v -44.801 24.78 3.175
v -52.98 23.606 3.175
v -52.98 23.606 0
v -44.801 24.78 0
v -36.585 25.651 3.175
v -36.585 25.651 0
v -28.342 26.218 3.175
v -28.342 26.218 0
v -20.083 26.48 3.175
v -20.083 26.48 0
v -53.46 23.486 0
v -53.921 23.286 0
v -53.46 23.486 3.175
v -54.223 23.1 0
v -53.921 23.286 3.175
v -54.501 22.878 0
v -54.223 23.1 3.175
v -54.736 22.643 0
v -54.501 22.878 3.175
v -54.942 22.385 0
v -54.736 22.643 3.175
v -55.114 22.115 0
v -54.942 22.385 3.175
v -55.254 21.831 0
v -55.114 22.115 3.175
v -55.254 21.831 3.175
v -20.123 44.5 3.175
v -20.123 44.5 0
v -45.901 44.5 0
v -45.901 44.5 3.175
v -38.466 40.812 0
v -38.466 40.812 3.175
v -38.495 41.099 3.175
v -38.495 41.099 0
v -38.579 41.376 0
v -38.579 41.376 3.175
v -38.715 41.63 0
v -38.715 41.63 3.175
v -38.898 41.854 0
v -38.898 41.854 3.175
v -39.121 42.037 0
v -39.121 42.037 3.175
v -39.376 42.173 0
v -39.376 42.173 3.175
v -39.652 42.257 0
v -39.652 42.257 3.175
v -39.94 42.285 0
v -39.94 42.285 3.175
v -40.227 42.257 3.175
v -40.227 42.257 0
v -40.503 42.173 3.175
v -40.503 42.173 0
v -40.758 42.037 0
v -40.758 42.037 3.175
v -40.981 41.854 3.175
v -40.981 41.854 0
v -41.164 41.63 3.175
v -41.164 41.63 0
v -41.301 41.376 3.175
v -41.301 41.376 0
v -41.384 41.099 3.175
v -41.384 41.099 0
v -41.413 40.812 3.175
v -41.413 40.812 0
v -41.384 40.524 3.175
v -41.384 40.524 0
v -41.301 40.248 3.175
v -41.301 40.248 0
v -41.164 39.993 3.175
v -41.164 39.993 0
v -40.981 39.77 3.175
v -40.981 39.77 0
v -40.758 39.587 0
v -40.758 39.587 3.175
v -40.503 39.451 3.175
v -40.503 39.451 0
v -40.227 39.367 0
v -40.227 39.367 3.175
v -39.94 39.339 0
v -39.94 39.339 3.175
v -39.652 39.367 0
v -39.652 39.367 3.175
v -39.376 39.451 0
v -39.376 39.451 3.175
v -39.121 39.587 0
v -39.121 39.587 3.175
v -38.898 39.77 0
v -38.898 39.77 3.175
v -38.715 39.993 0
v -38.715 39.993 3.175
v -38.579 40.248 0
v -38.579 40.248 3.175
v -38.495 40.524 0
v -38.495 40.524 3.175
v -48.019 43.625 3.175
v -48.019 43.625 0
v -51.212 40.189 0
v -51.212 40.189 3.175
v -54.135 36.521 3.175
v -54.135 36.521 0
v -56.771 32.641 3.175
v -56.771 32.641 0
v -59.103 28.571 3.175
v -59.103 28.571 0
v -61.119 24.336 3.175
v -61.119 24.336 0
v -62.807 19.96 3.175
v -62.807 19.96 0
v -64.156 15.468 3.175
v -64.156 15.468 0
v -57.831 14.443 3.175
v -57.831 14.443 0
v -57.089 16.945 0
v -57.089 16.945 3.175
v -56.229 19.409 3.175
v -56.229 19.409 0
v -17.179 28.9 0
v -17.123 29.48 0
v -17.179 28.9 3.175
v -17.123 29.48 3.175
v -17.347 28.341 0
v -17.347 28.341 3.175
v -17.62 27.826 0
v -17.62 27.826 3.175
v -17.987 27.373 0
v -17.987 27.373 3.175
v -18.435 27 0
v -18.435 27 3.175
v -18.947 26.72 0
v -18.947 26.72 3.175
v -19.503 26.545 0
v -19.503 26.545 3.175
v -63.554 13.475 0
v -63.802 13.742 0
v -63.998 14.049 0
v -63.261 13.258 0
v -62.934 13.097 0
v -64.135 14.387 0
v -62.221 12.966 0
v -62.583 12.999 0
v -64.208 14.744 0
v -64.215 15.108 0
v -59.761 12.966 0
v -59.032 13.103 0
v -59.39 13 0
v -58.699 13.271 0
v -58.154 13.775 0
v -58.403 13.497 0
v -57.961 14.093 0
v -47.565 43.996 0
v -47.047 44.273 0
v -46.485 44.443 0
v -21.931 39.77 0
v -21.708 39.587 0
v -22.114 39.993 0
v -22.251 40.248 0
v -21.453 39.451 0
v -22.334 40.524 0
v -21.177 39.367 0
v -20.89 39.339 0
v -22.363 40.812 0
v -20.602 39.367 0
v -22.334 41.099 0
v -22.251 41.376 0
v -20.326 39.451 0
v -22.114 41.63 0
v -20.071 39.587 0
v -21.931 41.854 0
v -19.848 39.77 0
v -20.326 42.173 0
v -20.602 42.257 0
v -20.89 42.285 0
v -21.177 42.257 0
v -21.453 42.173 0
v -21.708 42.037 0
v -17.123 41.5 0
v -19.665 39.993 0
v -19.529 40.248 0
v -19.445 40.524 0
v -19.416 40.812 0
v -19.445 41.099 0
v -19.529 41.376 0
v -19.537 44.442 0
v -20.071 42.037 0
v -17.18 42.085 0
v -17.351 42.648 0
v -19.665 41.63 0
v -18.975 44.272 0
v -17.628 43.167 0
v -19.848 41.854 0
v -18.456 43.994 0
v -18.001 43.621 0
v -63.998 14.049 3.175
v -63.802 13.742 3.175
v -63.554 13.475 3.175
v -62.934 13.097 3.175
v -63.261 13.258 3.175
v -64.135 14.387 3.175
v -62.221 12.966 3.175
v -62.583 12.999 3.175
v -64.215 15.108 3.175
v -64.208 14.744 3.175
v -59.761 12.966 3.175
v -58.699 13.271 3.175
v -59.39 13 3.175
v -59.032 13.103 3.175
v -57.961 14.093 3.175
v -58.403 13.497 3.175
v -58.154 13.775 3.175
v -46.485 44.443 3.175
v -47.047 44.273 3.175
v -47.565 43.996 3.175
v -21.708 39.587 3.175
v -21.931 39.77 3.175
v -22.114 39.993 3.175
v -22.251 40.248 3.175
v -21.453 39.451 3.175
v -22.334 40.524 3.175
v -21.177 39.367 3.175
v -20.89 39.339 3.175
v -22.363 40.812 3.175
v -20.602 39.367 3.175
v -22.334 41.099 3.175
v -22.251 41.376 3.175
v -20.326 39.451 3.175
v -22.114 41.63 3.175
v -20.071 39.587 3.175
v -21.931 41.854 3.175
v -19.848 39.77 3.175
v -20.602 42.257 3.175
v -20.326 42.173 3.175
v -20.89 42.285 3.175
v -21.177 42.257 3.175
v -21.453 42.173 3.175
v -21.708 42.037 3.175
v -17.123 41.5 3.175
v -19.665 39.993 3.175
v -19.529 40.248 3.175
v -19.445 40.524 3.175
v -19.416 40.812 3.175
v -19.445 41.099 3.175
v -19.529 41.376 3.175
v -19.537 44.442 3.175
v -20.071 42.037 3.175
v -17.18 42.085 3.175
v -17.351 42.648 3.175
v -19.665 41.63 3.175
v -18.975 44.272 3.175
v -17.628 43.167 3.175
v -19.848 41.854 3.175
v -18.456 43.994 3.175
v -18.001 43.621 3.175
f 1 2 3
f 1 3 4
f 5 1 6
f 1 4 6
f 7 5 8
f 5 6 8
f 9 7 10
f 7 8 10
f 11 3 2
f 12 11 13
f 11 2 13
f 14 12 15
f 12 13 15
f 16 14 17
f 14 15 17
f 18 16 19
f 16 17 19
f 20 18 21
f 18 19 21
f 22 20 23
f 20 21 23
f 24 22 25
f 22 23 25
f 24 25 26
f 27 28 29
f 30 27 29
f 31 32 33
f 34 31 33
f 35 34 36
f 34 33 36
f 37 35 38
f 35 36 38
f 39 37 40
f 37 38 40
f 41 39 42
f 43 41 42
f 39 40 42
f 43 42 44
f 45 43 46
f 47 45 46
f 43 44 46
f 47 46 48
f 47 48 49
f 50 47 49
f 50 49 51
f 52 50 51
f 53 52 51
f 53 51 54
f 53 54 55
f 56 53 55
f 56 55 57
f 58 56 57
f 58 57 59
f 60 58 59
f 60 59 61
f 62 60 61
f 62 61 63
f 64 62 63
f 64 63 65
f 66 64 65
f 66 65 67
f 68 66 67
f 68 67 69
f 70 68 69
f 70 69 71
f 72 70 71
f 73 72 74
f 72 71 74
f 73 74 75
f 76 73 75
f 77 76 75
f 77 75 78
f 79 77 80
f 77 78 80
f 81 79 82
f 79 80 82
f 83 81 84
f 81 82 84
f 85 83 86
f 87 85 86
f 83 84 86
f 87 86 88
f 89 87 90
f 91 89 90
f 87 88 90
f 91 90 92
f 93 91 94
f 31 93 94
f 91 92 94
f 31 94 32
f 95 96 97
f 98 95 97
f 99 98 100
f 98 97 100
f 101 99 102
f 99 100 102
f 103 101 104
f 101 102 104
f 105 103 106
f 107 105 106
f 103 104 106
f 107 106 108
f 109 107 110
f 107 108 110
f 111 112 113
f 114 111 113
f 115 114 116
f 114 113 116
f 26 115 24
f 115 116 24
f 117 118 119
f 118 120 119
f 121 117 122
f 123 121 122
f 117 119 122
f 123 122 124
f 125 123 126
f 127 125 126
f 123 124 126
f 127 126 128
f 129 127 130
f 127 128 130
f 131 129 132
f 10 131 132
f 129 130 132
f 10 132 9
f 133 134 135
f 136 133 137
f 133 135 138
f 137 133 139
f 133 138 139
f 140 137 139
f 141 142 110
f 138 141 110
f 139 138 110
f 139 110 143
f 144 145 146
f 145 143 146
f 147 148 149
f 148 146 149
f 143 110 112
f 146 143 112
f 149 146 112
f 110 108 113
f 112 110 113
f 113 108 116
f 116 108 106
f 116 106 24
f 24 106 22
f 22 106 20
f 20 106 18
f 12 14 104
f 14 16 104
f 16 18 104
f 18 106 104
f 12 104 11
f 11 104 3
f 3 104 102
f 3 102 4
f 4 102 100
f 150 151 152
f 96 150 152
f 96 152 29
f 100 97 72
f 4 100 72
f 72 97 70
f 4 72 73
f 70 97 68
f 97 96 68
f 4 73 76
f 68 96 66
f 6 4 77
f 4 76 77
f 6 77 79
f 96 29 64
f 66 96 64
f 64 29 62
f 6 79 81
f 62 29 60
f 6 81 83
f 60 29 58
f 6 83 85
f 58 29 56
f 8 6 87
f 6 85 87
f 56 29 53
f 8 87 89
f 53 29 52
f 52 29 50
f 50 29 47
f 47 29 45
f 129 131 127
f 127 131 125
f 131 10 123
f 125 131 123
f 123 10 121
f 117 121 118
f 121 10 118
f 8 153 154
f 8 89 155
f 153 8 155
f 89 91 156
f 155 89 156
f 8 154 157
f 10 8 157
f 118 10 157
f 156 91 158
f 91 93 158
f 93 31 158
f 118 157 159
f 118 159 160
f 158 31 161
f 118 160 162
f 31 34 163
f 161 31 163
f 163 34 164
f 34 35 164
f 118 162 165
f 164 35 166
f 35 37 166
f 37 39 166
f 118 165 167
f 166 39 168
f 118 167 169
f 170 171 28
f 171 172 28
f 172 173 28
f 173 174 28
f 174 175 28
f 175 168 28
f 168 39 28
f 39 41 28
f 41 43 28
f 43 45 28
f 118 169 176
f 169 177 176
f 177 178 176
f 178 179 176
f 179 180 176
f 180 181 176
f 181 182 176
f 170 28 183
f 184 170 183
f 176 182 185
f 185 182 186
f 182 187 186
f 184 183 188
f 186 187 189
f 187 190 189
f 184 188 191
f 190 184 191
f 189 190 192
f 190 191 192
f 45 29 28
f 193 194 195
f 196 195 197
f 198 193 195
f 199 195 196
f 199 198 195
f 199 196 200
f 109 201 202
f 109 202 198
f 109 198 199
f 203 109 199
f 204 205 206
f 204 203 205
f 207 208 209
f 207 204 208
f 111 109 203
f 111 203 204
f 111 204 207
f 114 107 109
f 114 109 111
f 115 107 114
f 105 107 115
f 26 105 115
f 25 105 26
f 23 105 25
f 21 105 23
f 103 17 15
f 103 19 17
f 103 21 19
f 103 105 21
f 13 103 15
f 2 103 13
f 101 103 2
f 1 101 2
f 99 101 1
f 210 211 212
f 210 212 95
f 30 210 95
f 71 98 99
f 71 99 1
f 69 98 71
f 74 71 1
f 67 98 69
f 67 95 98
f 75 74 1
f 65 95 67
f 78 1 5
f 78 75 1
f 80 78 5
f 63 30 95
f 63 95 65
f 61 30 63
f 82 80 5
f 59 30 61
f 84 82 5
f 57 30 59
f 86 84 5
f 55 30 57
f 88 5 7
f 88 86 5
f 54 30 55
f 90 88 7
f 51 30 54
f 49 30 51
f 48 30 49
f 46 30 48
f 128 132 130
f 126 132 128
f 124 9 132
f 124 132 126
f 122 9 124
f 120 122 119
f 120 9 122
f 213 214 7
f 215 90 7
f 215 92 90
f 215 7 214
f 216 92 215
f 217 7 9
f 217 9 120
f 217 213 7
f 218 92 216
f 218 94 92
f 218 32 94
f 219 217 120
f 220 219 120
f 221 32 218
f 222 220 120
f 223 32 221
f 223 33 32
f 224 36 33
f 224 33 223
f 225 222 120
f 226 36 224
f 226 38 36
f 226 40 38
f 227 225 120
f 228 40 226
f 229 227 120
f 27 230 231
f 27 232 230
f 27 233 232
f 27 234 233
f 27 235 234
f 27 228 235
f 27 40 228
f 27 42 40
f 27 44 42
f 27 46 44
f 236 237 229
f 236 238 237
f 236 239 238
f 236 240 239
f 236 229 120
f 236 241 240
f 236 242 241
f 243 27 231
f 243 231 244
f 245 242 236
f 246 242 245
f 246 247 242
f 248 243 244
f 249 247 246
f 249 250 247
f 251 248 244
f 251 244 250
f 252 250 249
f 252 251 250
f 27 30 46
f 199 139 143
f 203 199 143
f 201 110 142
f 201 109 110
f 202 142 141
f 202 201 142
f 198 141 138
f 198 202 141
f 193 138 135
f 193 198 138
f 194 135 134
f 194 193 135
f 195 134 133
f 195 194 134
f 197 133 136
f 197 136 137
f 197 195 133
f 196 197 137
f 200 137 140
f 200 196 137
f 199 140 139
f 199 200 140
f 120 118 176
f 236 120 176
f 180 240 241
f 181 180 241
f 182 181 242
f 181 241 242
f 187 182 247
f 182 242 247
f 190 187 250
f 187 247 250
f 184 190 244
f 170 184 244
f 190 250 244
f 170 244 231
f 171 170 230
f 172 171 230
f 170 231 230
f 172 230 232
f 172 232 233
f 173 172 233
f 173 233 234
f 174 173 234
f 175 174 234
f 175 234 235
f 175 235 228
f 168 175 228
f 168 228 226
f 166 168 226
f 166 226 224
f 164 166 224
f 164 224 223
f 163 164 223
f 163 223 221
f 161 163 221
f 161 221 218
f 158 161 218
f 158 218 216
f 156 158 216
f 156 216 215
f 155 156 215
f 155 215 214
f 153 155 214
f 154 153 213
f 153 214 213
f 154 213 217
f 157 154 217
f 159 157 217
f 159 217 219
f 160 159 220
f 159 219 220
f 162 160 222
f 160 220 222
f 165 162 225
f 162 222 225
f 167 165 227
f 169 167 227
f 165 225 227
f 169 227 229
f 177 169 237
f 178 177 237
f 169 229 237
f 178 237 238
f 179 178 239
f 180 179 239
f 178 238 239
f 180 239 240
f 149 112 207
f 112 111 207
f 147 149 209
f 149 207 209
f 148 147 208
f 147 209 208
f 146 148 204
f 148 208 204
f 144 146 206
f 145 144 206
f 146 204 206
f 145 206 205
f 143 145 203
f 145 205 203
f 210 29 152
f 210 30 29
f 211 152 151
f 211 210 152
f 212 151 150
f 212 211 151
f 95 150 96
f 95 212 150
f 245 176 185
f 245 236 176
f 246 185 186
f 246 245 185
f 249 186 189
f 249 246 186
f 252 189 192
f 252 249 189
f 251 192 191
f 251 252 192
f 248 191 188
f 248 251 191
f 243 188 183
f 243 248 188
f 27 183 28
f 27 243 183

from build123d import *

# Parameters (mm, degrees)
BOSS_EXTRUDE1_DEPTH = 3.175
SKETCH2_R           = 1.4732
CUT_EXTRUDE1_DEPTH  = 4.175
FILLET1_R           = 3
FILLET3_R           = 2


with BuildPart() as part:
    # Sketch1 → Boss-Extrude1 (new body)
    with BuildSketch(Plane.XY):
        with BuildLine():
            Line((-17.122741189, 26.5), (-17.122741189, 44.5))
            Line((-17.122741189, 44.5), (-47.122741189, 44.5))
            ThreePointArc((-47.122741189, 44.5), (-58.300369938, 30.054224058), (-64.75017234, 12.965635))
            Line((-64.75017234, 12.965635), (-58.20928788, 12.965635))
            ThreePointArc((-58.20928788, 12.965635), (-56.652290629, 18.243467198), (-54.577718421, 23.340123288))
            ThreePointArc((-54.577718421, 23.340123288), (-35.916757127, 25.708630171), (-17.122741189, 26.5))
        make_face()
    extrude(amount=BOSS_EXTRUDE1_DEPTH)

    # Sketch2 → Cut-Extrude1 (cut, through all)
    with BuildSketch(Plane.XY.offset(3.175)):
        with Locations((-20.889565657, 40.81189221)):
            Circle(SKETCH2_R)
        with Locations((-39.939565657, 40.81189221)):
            Circle(SKETCH2_R)
    extrude(amount=-CUT_EXTRUDE1_DEPTH, mode=Mode.SUBTRACT)

    # Fillet1
    fillet1_edges = [part.edges().sort_by_distance(p)[0] for p in [
        (-47.122741189, 44.5, 1.5875),
        (-17.122741189, 44.5, 1.5875),
        (-17.122741189, 26.5, 1.5875),
        (-54.577718421, 23.340123288, 1.5875),
    ]]
    fillet(fillet1_edges, radius=FILLET1_R)

    # Fillet3
    fillet3_edges = [part.edges().sort_by_distance(p)[0] for p in [
        (-58.20928788, 12.965635, 1.5875),
        (-64.75017234, 12.965635, 1.5875),
    ]]
    fillet(fillet3_edges, radius=FILLET3_R)


solid = part.part
